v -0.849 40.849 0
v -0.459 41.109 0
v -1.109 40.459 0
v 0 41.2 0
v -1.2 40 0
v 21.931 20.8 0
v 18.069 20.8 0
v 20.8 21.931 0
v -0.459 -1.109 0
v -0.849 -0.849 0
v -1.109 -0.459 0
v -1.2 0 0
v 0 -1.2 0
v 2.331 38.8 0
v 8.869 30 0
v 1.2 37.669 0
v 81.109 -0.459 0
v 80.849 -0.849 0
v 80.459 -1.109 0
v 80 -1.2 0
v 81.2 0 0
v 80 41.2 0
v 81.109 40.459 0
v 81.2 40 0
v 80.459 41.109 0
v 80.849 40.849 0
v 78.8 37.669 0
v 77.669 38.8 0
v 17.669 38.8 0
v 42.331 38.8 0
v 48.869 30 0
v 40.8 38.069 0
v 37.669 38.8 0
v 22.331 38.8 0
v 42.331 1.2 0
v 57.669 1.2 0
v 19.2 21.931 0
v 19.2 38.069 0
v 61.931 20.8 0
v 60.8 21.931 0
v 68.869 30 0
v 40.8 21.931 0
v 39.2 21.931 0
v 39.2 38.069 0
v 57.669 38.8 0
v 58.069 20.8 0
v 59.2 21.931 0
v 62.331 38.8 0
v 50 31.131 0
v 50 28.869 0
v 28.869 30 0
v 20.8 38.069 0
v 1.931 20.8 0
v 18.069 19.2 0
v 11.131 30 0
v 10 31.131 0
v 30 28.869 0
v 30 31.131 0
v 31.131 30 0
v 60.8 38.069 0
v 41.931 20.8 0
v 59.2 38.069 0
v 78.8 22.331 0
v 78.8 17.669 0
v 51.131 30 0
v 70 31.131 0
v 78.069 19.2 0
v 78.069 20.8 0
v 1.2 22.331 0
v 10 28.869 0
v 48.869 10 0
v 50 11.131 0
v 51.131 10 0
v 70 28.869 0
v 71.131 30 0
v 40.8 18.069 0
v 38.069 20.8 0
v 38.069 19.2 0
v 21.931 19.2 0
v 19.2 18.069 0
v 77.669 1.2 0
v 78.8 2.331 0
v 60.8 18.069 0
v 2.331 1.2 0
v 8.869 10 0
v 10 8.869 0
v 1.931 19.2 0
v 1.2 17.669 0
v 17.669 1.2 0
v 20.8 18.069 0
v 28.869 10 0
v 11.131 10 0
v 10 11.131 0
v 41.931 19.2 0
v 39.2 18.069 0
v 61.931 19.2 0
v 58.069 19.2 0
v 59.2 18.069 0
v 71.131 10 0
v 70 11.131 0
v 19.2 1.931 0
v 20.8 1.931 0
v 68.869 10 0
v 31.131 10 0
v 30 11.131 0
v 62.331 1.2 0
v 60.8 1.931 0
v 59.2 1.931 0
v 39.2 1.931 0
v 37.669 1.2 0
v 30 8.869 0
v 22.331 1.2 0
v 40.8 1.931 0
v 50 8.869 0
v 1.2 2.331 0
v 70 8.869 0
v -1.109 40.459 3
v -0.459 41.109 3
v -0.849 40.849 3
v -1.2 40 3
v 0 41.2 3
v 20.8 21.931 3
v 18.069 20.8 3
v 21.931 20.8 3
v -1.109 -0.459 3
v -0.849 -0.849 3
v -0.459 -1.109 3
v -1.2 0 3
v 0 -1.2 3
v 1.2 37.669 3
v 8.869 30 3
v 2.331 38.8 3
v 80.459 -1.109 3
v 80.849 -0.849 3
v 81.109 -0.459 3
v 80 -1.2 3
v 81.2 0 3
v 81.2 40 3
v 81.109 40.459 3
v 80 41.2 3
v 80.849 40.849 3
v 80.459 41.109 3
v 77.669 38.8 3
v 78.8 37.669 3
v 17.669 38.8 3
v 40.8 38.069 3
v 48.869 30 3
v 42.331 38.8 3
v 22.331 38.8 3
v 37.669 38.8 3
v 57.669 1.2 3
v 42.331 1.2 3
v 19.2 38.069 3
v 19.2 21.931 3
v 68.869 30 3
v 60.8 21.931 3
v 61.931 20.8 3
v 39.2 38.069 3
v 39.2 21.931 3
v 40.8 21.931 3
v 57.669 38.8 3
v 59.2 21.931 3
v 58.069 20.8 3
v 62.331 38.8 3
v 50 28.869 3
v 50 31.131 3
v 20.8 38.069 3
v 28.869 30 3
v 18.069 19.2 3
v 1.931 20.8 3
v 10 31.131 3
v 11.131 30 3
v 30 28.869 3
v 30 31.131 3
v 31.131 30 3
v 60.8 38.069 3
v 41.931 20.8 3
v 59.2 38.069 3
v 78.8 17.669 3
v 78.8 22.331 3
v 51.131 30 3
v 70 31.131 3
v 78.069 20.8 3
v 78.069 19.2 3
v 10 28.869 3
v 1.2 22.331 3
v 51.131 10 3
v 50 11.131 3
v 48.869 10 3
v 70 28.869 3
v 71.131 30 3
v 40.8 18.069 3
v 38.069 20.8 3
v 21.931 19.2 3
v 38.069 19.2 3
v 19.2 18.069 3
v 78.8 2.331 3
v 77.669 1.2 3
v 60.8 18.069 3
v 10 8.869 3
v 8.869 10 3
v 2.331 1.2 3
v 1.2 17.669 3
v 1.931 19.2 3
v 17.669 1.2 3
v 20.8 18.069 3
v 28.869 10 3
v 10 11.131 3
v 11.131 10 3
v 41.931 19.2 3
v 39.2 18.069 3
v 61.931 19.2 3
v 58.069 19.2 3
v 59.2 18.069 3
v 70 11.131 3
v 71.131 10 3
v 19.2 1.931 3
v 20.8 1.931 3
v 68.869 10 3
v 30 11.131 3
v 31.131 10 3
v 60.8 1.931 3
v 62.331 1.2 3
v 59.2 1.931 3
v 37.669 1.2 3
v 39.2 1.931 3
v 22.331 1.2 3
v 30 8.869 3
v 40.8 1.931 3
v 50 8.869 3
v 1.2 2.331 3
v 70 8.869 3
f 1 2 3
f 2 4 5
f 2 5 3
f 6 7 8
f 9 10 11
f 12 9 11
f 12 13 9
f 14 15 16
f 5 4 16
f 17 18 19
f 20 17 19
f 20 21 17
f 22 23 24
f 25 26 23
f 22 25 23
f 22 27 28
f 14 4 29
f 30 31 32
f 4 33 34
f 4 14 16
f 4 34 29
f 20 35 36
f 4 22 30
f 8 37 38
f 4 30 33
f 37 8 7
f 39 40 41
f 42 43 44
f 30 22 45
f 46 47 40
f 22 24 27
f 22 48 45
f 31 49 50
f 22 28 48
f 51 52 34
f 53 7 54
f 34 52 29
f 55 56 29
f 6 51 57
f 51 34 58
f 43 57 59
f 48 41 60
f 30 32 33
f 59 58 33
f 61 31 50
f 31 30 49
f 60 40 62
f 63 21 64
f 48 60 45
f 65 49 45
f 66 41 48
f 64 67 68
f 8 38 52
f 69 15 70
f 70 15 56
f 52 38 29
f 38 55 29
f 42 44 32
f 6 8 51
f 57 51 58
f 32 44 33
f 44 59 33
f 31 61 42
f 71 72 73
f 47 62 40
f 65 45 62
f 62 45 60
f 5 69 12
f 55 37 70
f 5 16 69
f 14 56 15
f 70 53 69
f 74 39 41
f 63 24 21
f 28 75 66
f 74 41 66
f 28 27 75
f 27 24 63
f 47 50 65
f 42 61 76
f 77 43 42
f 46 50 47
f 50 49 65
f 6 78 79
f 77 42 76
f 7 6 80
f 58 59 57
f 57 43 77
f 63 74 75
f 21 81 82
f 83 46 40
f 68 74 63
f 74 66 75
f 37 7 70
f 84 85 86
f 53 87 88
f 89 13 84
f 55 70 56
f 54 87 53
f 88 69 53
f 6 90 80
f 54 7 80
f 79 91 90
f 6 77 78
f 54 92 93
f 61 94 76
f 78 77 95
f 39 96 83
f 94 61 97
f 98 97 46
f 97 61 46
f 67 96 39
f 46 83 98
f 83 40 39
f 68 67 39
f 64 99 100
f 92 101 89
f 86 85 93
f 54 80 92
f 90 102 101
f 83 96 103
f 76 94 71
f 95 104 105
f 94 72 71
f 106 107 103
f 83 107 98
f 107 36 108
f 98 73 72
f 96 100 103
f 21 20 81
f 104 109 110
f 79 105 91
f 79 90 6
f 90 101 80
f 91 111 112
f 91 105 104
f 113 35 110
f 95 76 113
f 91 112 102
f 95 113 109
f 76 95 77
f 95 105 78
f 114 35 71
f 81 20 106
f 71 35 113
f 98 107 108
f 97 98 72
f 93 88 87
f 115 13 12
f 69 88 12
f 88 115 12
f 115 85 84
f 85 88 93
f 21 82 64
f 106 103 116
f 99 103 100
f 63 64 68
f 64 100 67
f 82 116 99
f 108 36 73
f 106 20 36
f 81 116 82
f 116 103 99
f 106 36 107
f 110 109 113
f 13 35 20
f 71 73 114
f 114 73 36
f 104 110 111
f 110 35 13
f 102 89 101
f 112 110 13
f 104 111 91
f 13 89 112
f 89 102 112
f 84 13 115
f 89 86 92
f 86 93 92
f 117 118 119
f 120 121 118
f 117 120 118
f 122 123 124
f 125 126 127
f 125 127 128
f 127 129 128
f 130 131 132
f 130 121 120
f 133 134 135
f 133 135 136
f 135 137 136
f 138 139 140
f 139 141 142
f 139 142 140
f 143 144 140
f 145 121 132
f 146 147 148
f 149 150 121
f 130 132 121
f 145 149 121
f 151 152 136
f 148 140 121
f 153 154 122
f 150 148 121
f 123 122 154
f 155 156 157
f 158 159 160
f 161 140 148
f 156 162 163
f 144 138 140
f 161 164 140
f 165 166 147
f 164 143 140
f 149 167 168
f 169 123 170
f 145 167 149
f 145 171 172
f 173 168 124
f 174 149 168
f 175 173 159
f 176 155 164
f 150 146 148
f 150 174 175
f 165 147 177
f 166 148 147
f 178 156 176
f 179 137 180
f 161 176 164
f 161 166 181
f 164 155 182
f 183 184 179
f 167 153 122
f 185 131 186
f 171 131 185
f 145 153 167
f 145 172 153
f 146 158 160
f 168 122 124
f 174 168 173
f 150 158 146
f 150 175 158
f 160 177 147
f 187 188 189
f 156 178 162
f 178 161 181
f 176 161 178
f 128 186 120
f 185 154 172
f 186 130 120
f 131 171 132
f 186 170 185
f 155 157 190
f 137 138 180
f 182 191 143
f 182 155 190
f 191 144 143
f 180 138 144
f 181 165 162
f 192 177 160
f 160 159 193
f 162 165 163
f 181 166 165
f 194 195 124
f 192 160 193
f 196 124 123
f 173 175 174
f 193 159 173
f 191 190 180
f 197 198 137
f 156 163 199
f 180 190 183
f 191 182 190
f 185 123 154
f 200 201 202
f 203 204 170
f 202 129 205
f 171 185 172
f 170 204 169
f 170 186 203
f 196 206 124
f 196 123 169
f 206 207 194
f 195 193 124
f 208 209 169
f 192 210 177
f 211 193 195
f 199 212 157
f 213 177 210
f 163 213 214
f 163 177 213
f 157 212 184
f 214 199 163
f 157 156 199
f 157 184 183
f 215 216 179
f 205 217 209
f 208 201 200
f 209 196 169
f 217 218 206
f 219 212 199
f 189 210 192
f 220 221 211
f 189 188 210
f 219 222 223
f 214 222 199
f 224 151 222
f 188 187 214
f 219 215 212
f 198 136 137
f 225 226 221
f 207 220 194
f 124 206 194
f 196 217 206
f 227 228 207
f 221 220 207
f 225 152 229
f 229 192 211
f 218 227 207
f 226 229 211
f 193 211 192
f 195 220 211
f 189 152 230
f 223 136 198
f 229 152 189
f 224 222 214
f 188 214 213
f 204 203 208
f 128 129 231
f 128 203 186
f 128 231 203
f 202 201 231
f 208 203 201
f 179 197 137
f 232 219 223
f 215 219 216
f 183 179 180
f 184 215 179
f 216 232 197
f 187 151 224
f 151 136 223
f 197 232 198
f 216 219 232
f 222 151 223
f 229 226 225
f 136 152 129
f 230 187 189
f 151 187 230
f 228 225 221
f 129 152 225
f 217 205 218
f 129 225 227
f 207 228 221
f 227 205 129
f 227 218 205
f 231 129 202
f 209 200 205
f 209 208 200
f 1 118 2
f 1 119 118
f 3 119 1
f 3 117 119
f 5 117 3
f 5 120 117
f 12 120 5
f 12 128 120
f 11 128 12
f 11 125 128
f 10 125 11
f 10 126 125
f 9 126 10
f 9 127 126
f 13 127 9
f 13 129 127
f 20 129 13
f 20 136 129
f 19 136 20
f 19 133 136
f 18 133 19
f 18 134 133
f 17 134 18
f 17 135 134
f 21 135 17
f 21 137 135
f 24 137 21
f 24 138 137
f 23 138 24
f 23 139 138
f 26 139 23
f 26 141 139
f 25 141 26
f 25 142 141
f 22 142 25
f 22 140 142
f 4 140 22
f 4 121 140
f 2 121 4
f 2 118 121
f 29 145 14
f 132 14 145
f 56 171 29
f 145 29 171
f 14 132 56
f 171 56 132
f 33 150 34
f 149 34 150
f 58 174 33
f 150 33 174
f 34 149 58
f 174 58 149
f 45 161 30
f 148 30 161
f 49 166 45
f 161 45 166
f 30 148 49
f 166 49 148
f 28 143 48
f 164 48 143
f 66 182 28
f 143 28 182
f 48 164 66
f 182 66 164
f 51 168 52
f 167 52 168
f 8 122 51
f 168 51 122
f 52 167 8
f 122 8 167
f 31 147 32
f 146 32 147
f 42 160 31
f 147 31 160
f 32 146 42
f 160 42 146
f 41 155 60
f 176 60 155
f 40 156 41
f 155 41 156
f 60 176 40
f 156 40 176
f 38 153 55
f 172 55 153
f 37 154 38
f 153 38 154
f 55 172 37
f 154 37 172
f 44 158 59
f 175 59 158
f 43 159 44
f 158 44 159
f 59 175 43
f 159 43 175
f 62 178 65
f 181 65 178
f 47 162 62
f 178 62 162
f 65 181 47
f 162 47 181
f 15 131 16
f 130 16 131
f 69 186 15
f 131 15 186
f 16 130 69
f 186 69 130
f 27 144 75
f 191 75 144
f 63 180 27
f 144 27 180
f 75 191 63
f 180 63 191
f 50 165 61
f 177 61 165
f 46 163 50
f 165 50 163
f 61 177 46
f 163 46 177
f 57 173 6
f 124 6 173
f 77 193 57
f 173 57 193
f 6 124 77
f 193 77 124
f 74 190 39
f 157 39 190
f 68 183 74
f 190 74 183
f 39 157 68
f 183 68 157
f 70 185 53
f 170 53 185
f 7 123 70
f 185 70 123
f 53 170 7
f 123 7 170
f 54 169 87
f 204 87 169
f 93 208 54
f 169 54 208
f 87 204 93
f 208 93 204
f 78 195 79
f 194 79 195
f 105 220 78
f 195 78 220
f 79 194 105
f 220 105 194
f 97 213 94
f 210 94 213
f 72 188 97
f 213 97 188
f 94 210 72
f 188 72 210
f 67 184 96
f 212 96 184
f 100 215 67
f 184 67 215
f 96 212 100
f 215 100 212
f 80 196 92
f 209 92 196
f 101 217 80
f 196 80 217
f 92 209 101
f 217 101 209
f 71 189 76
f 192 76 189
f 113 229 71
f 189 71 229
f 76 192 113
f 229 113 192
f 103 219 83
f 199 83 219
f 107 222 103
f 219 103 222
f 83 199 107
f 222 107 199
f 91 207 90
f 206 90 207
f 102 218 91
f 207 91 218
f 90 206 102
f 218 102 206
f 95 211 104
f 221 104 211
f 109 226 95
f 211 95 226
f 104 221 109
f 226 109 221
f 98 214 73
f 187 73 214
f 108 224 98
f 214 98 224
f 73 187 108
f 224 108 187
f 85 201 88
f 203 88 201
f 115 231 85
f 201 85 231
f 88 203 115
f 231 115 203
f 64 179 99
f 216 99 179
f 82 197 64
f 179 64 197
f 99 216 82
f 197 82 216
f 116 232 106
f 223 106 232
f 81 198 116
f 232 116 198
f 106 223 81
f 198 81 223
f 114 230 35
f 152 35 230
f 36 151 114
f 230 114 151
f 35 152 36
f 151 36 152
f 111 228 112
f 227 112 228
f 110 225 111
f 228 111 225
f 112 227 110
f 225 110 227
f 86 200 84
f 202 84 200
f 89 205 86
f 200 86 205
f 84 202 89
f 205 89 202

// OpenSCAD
// skeletonized_wall.scad
//
// A skeletonized wall: a grid of rectangular cells with diagonal cross
// braces. Removes material (weight / print time / filament) from a solid
// wall while keeping stiffness through the triangulated bracing.
//
// Units are millimeters. The wall face lies in the XY plane (width along X,
// height along Y) and is extruded along Z by `thickness`. To stand it up as
// an actual wall, rotate([90, 0, 0]) after calling.
//
// Usage:
//   use <skeletonized_wall.scad>
//   skeletonized_wall(width = 80, height = 40, thickness = 3,
//                     cols = 4, rows = 2, strut = 1.6);
//
// Open this file directly (or `include <>` it) to render the demo at the
// bottom; `use <>` imports the modules without rendering anything.

// ---------------------------------------------------------------------------
// Low-level helper
// ---------------------------------------------------------------------------

// A thick 2D line segment from p1 to p2 with the given width and rounded
// ends, so struts meeting at a node blend into a smooth joint.
module strut(p1, p2, width, fn = 16) {
    hull() {
        translate(p1) circle(d = width, $fn = fn);
        translate(p2) circle(d = width, $fn = fn);
    }
}

// ---------------------------------------------------------------------------
// 2D pattern
// ---------------------------------------------------------------------------

// The flat skeletonized pattern in the XY plane, occupying [0,width] x [0,height].
//
//   width, height : overall size of the panel (mm)
//   cols, rows    : number of cells across and up
//   strut         : thickness of the internal struts and diagonals (mm)
//   frame_strut   : thickness of the outer border; defaults to strut
//   braces        : diagonal style per cell -
//                     "x" both diagonals (default), "/" or "\" a single
//                     diagonal, "none" for an open grid
module skeletonized_wall_2d(width, height, cols = 3, rows = 2,
                            strut = 1.6, frame_strut = undef, braces = "x") {
    fs = is_undef(frame_strut) ? strut : frame_strut;
    cw = width / cols;
    ch = height / rows;

    union() {
        // Outer frame.
        strut([0, 0],          [width, 0],       fs);
        strut([width, 0],      [width, height],  fs);
        strut([width, height], [0, height],      fs);
        strut([0, height],     [0, 0],           fs);

        // Internal vertical dividers.
        if (cols > 1)
            for (i = [1 : cols - 1])
                strut([i * cw, 0], [i * cw, height], strut);

        // Internal horizontal dividers.
        if (rows > 1)
            for (j = [1 : rows - 1])
                strut([0, j * ch], [width, j * ch], strut);

        // Diagonal cross bracing, per cell.
        for (i = [0 : cols - 1], j = [0 : rows - 1]) {
            x0 = i * cw; y0 = j * ch;
            x1 = x0 + cw; y1 = y0 + ch;
            if (braces == "x" || braces == "/")
                strut([x0, y0], [x1, y1], strut);
            if (braces == "x" || braces == "\\")
                strut([x0, y1], [x1, y0], strut);
        }
    }
}

// ---------------------------------------------------------------------------
// 3D wall
// ---------------------------------------------------------------------------

// The skeletonized pattern extruded to a solid wall of the given thickness.
// Parameters match skeletonized_wall_2d plus:
//   thickness : extrusion depth along Z (mm)
module skeletonized_wall(width, height, thickness, cols = 3, rows = 2,
                         strut = 1.6, frame_strut = undef, braces = "x") {
    linear_extrude(height = thickness, convexity = 10)
        skeletonized_wall_2d(width, height, cols, rows,
                             strut, frame_strut, braces);
}

// ---------------------------------------------------------------------------
// Demo (rendered only when this file is opened / included directly)
// ---------------------------------------------------------------------------

skeletonized_wall(width = 80, height = 40, thickness = 3,
                  cols = 4, rows = 2, strut = 1.6, frame_strut = 2.4);
